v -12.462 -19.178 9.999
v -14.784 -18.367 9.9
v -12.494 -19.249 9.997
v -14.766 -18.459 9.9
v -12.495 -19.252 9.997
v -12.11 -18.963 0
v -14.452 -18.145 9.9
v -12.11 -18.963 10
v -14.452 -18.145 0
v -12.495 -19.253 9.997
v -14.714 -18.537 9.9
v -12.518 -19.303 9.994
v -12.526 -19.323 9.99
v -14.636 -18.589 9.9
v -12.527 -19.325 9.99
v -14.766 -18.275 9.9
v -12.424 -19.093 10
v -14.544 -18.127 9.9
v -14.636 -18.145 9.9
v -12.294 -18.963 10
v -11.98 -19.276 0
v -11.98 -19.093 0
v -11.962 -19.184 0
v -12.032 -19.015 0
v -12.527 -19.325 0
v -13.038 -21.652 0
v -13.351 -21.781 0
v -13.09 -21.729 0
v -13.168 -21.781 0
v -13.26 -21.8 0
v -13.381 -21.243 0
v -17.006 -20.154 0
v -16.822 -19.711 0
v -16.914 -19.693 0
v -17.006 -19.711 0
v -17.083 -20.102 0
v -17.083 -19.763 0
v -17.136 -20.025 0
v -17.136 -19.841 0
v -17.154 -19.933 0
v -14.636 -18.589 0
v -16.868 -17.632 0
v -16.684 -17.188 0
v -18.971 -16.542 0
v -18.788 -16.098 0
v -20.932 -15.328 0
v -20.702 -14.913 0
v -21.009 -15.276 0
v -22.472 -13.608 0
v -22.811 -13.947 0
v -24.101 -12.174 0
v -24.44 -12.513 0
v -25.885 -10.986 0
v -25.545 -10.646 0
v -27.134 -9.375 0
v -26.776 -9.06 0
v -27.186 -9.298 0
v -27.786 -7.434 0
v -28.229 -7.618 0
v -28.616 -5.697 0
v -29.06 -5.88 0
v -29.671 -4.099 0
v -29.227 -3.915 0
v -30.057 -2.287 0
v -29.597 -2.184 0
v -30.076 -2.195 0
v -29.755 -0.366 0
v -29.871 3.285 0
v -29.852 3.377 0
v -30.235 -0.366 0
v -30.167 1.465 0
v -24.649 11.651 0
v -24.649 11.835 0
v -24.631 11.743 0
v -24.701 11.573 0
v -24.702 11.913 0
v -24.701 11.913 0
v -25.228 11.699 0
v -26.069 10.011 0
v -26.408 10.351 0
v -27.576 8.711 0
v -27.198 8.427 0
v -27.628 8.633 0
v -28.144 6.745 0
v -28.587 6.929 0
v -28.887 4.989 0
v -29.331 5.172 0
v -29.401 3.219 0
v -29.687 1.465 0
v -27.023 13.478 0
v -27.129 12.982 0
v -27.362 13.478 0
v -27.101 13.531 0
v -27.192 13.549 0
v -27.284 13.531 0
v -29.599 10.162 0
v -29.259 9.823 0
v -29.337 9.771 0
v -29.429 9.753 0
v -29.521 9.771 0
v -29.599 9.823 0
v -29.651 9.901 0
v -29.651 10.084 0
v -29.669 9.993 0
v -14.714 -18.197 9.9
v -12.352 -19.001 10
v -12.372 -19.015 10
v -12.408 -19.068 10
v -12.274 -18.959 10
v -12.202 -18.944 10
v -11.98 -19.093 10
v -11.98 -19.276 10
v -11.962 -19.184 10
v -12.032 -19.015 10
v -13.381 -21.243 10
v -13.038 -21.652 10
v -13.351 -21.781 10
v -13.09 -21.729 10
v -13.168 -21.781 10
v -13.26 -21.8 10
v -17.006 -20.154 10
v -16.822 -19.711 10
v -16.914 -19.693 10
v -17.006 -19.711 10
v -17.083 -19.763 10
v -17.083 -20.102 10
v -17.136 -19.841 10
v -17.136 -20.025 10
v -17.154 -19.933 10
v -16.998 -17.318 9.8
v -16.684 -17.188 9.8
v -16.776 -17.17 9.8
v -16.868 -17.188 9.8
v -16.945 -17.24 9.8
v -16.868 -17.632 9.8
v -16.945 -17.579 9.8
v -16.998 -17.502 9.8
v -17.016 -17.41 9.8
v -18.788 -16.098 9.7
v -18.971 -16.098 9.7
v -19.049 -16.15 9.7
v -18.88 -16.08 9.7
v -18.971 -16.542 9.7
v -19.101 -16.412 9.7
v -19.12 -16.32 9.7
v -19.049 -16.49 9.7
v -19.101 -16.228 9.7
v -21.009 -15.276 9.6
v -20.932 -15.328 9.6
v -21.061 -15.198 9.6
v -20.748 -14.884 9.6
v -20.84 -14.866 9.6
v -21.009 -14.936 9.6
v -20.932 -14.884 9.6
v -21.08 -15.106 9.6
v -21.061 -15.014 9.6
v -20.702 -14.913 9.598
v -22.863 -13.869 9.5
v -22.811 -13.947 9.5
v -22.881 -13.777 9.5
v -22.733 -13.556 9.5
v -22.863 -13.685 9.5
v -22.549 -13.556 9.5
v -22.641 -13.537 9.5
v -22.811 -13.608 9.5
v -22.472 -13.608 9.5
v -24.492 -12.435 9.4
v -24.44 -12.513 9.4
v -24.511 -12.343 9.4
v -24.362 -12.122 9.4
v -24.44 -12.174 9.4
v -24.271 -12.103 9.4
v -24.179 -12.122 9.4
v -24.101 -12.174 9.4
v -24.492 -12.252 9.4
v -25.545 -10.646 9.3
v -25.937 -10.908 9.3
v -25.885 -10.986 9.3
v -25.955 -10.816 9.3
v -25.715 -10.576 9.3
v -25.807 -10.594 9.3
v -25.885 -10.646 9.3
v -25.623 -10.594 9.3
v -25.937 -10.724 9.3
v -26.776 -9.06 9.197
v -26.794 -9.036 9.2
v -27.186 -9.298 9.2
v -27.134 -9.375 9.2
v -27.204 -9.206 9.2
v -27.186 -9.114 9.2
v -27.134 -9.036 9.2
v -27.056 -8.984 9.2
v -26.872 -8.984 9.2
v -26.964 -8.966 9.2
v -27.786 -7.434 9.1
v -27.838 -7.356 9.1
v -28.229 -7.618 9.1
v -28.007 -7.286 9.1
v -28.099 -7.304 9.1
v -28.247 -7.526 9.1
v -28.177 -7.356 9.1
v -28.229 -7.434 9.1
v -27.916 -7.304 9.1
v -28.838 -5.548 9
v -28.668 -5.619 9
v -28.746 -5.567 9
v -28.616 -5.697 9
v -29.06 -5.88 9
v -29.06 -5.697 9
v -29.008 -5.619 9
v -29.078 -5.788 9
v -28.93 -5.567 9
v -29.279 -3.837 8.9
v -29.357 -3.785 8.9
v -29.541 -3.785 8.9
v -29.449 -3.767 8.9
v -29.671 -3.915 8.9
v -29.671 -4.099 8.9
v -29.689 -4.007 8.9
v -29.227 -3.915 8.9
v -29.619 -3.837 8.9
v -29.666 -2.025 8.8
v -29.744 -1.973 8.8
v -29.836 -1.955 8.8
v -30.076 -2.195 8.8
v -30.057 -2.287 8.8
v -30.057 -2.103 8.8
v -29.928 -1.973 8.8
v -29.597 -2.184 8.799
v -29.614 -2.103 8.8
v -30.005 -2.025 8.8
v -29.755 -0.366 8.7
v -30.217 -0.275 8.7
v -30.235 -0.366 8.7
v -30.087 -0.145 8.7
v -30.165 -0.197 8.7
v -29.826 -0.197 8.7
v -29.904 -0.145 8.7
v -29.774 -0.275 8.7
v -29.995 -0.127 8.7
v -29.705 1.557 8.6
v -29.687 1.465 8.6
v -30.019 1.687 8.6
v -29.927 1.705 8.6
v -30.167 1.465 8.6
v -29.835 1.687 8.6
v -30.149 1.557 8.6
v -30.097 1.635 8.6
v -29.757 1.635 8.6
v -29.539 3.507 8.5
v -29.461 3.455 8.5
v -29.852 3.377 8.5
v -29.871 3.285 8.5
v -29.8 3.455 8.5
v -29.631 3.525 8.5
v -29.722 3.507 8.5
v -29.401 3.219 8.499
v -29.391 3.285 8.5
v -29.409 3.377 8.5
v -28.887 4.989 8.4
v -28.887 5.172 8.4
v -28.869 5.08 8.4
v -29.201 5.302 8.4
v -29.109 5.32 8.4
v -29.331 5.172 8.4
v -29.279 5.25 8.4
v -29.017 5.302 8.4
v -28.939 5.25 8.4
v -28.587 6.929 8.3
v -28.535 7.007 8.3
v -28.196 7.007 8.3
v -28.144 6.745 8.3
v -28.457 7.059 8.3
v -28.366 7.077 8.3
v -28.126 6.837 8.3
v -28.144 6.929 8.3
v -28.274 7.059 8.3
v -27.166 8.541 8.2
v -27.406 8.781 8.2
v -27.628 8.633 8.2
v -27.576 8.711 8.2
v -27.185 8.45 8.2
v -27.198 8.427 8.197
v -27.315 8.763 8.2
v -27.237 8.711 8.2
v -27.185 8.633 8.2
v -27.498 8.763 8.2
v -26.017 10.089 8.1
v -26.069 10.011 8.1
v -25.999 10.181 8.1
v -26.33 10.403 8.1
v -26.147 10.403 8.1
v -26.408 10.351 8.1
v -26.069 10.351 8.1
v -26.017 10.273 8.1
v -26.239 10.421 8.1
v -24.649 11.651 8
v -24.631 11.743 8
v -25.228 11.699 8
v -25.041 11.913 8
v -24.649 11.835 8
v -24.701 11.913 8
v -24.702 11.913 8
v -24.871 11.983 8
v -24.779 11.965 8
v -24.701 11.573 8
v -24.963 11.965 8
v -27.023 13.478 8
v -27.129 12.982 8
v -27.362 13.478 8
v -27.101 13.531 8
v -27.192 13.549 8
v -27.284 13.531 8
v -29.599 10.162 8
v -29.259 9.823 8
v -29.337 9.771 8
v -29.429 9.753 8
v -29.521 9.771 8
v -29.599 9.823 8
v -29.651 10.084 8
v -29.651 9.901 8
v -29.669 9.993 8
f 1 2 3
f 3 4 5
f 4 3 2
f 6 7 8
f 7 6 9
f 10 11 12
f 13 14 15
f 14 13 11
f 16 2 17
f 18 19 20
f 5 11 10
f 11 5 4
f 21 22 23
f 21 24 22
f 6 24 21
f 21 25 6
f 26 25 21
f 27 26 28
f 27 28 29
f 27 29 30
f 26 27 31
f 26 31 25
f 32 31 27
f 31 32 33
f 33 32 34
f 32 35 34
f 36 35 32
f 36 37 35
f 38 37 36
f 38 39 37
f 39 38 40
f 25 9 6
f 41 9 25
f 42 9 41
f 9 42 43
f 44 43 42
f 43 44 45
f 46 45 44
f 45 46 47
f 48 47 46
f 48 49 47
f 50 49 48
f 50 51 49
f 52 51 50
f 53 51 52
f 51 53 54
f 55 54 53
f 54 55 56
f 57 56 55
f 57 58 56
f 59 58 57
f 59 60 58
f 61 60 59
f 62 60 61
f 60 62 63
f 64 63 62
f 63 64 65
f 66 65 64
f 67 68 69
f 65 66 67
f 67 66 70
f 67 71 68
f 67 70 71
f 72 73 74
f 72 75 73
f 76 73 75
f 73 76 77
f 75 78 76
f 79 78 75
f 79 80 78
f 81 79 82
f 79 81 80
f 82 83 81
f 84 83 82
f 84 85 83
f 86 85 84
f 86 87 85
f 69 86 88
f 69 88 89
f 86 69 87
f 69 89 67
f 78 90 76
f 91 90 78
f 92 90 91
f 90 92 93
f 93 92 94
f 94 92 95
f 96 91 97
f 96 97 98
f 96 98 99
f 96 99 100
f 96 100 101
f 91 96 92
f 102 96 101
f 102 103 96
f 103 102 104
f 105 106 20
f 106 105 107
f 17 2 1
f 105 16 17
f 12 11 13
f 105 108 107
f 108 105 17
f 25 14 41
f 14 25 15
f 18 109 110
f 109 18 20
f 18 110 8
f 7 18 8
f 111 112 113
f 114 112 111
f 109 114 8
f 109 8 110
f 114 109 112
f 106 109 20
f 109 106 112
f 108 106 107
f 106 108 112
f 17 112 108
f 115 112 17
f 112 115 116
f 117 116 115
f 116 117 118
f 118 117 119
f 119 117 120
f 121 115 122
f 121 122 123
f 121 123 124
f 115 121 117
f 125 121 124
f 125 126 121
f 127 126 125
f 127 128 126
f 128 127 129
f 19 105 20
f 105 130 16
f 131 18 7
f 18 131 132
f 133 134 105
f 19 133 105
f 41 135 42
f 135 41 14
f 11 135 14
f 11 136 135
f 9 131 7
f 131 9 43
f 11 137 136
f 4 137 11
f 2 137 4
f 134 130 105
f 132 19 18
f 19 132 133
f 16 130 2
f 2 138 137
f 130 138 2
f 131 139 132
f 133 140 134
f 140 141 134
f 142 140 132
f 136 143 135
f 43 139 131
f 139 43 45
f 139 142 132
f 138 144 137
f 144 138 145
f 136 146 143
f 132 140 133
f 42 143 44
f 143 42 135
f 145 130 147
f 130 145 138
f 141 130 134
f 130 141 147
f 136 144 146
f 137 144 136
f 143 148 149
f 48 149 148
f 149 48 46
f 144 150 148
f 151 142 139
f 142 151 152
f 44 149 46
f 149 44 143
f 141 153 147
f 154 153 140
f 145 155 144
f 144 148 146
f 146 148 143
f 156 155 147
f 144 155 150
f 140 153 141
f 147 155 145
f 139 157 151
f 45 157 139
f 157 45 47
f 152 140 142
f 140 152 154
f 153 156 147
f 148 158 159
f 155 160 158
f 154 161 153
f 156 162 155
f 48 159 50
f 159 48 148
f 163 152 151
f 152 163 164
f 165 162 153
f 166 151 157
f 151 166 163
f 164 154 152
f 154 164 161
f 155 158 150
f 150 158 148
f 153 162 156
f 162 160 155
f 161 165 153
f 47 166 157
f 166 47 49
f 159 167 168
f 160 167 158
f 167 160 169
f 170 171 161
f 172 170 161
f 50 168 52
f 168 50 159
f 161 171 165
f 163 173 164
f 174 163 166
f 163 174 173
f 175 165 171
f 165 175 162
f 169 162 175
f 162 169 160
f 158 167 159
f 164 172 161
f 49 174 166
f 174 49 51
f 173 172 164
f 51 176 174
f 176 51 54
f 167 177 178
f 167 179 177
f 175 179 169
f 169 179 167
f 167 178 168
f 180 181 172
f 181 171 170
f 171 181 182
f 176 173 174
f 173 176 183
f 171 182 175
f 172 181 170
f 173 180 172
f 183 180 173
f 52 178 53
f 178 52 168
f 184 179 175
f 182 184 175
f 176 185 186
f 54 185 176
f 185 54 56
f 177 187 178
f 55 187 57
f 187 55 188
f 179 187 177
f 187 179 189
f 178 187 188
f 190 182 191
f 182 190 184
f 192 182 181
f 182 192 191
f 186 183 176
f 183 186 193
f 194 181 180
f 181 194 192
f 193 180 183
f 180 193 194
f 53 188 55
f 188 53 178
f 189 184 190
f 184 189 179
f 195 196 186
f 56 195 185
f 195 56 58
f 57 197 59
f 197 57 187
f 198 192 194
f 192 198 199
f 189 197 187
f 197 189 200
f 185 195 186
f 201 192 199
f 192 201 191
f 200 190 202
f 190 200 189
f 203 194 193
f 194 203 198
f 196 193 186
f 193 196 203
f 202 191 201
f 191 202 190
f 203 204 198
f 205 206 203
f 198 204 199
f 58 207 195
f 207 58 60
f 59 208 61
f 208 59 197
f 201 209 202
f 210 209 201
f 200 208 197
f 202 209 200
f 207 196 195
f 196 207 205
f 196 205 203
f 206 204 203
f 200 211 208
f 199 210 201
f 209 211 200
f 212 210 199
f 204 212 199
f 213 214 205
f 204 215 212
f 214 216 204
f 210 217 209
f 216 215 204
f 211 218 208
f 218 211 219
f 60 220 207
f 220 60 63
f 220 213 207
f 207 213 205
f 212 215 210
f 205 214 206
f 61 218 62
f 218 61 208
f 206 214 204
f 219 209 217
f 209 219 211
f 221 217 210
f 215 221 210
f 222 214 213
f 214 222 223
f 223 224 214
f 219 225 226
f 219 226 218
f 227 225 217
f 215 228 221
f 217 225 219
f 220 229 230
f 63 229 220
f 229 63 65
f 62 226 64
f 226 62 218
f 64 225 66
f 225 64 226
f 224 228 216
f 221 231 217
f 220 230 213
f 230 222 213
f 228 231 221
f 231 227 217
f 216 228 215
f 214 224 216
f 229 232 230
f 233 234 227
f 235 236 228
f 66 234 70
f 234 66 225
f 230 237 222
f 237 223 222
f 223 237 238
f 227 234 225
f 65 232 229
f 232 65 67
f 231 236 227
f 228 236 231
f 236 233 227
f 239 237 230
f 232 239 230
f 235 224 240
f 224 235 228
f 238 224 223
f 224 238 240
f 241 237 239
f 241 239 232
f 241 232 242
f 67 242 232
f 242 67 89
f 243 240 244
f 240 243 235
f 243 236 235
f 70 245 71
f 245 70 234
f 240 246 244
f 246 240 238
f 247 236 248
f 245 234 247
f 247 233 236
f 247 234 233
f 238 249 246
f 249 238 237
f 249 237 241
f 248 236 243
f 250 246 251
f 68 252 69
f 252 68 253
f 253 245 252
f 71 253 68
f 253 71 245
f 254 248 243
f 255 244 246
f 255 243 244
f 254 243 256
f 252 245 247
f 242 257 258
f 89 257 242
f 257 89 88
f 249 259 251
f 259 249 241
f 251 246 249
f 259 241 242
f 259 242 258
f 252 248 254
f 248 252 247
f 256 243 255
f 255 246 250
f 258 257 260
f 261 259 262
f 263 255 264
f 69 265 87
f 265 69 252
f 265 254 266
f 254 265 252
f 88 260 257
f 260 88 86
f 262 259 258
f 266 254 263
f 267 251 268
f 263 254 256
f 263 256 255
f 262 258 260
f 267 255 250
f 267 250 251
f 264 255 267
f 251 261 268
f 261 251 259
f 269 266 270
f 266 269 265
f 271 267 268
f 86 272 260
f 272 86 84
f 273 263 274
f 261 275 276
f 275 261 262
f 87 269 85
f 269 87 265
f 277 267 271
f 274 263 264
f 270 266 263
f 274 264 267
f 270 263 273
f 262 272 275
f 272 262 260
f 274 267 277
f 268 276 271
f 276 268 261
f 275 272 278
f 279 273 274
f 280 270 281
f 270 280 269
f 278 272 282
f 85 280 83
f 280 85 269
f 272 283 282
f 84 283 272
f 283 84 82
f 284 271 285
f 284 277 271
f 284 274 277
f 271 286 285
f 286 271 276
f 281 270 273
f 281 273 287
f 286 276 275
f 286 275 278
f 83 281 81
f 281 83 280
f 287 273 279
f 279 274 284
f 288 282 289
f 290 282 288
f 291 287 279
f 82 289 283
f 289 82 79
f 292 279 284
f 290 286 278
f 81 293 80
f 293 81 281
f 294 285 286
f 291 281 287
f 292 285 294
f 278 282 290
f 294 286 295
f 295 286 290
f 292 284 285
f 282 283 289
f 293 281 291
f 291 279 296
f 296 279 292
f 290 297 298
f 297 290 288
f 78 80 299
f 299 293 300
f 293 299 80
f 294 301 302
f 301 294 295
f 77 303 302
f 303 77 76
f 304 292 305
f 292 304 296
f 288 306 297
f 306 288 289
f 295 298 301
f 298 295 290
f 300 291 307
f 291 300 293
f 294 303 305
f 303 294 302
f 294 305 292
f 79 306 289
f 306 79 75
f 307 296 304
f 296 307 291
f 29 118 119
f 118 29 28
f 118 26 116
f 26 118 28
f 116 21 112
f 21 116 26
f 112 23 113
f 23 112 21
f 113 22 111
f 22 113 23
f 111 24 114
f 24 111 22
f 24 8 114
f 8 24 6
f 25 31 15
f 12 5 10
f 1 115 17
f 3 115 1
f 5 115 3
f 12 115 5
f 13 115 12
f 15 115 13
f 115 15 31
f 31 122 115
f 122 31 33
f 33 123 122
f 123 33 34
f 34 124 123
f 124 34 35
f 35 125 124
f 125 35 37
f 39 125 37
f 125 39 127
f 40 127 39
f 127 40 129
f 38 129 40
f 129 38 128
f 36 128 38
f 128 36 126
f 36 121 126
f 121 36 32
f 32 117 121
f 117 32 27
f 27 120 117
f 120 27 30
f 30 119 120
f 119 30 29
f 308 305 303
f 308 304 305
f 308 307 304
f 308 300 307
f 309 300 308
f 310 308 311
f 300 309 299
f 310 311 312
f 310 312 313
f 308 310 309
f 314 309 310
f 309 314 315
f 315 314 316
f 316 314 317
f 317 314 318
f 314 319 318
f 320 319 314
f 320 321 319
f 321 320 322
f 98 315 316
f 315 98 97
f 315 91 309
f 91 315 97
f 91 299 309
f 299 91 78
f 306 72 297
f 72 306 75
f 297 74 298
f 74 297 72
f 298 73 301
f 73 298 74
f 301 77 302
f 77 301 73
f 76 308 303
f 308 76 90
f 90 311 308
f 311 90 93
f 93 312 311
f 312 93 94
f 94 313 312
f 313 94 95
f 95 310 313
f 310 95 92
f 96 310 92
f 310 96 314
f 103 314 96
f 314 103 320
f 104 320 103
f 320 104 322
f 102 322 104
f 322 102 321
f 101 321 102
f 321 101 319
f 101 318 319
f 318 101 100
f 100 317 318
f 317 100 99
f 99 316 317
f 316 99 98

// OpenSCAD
// --- Parameters ---
wrist_width        = 60;  // Width of wrist (X-axis)
wrist_depth        = 42;  // Depth of wrist (Y-axis)
wall_thickness     = 0.48; // Thickness of the band wall
wall_height_start  = 10;  // Height at the beginning of the band
wall_height_end    = 8;   // Height at the end of the band
open_angle         = 260;  // Gap size in degrees
gap_rotation       = 74;   // Where the band is open (0 = top, 90 = right, 180 = bottom, 270 = left)
hook_standoff_left = 2.6; // Distance the left hooks stand off from the band (gap)
hook_standoff_right= 2.8; // Distance the right hooks stand off from the band (gap)
hook_length        = 4;   // How far the hook reaches backward
$fn                = 64;  // Smoothness of the curves

// --- Core Math ---
x_radius = wrist_width / 2;
y_radius = wrist_depth / 2;

// Adjusted start and end angles based on the gap rotation parameter
start_angle = (open_angle / 2) + gap_rotation;
end_angle = 360 - (open_angle / 2) + gap_rotation;
step = 5; 

// Generate core arc points
arc_points = [for (a = [start_angle : step : end_angle]) [x_radius * sin(a), y_radius * cos(a)]];
num_segments = len(arc_points) - 1;

// Hook positions (at the very ends)
p_start_1 = arc_points[0];
p_end_1   = arc_points[len(arc_points)-1];

dir_out_start_1  = [sin(start_angle), cos(start_angle)];
dir_back_start_1 = [cos(start_angle), -sin(start_angle)]; 

dir_out_end_1    = [sin(end_angle), cos(end_angle)];
dir_back_end_1   = [-cos(end_angle), sin(end_angle)];   

// --- 3D Render ---

// Draw the main C-band with tapering height resting flat on Z=0
for (i = [0 : num_segments - 1]) {
    // Calculate interpolated height for the current segment
    h_start = wall_height_start + (wall_height_end - wall_height_start) * (i / num_segments);
    h_end   = wall_height_start + (wall_height_end - wall_height_start) * ((i + 1) / num_segments);
    
    hull() {
        linear_extrude(height = h_start, center = false) translate(arc_points[i]) circle(d = wall_thickness, $fn = 16);
        linear_extrude(height = h_end, center = false) translate(arc_points[i+1]) circle(d = wall_thickness, $fn = 16);
    }
}

// Draw Primary Hooks (Outer) resting flat on Z=0 to match the band ends
linear_extrude(height = wall_height_start, center = false) {
    hook(p_start_1, dir_out_start_1, dir_back_start_1, hook_standoff_left, hook_length, wall_thickness);
}

linear_extrude(height = wall_height_end, center = false) {
    hook(p_end_1, dir_out_end_1, dir_back_end_1, hook_standoff_right, hook_length, wall_thickness);
}

// --- Modules ---

// Reusable Hook Module
module hook(base_pt, out_dir, back_dir, standoff, length, thickness) {
    p_standoff = base_pt + (out_dir * standoff);
    p_tip      = p_standoff + (back_dir * length);
    
    poly_line([base_pt, p_standoff, p_tip], thickness);
}

// Line Drawing Module
module poly_line(pts, thickness) {
    for (i = [0 : len(pts) - 2]) {
        hull() {
            translate(pts[i]) circle(d = thickness, $fn = 16);
            translate(pts[i+1]) circle(d = thickness, $fn = 16);
        }
    }
}
